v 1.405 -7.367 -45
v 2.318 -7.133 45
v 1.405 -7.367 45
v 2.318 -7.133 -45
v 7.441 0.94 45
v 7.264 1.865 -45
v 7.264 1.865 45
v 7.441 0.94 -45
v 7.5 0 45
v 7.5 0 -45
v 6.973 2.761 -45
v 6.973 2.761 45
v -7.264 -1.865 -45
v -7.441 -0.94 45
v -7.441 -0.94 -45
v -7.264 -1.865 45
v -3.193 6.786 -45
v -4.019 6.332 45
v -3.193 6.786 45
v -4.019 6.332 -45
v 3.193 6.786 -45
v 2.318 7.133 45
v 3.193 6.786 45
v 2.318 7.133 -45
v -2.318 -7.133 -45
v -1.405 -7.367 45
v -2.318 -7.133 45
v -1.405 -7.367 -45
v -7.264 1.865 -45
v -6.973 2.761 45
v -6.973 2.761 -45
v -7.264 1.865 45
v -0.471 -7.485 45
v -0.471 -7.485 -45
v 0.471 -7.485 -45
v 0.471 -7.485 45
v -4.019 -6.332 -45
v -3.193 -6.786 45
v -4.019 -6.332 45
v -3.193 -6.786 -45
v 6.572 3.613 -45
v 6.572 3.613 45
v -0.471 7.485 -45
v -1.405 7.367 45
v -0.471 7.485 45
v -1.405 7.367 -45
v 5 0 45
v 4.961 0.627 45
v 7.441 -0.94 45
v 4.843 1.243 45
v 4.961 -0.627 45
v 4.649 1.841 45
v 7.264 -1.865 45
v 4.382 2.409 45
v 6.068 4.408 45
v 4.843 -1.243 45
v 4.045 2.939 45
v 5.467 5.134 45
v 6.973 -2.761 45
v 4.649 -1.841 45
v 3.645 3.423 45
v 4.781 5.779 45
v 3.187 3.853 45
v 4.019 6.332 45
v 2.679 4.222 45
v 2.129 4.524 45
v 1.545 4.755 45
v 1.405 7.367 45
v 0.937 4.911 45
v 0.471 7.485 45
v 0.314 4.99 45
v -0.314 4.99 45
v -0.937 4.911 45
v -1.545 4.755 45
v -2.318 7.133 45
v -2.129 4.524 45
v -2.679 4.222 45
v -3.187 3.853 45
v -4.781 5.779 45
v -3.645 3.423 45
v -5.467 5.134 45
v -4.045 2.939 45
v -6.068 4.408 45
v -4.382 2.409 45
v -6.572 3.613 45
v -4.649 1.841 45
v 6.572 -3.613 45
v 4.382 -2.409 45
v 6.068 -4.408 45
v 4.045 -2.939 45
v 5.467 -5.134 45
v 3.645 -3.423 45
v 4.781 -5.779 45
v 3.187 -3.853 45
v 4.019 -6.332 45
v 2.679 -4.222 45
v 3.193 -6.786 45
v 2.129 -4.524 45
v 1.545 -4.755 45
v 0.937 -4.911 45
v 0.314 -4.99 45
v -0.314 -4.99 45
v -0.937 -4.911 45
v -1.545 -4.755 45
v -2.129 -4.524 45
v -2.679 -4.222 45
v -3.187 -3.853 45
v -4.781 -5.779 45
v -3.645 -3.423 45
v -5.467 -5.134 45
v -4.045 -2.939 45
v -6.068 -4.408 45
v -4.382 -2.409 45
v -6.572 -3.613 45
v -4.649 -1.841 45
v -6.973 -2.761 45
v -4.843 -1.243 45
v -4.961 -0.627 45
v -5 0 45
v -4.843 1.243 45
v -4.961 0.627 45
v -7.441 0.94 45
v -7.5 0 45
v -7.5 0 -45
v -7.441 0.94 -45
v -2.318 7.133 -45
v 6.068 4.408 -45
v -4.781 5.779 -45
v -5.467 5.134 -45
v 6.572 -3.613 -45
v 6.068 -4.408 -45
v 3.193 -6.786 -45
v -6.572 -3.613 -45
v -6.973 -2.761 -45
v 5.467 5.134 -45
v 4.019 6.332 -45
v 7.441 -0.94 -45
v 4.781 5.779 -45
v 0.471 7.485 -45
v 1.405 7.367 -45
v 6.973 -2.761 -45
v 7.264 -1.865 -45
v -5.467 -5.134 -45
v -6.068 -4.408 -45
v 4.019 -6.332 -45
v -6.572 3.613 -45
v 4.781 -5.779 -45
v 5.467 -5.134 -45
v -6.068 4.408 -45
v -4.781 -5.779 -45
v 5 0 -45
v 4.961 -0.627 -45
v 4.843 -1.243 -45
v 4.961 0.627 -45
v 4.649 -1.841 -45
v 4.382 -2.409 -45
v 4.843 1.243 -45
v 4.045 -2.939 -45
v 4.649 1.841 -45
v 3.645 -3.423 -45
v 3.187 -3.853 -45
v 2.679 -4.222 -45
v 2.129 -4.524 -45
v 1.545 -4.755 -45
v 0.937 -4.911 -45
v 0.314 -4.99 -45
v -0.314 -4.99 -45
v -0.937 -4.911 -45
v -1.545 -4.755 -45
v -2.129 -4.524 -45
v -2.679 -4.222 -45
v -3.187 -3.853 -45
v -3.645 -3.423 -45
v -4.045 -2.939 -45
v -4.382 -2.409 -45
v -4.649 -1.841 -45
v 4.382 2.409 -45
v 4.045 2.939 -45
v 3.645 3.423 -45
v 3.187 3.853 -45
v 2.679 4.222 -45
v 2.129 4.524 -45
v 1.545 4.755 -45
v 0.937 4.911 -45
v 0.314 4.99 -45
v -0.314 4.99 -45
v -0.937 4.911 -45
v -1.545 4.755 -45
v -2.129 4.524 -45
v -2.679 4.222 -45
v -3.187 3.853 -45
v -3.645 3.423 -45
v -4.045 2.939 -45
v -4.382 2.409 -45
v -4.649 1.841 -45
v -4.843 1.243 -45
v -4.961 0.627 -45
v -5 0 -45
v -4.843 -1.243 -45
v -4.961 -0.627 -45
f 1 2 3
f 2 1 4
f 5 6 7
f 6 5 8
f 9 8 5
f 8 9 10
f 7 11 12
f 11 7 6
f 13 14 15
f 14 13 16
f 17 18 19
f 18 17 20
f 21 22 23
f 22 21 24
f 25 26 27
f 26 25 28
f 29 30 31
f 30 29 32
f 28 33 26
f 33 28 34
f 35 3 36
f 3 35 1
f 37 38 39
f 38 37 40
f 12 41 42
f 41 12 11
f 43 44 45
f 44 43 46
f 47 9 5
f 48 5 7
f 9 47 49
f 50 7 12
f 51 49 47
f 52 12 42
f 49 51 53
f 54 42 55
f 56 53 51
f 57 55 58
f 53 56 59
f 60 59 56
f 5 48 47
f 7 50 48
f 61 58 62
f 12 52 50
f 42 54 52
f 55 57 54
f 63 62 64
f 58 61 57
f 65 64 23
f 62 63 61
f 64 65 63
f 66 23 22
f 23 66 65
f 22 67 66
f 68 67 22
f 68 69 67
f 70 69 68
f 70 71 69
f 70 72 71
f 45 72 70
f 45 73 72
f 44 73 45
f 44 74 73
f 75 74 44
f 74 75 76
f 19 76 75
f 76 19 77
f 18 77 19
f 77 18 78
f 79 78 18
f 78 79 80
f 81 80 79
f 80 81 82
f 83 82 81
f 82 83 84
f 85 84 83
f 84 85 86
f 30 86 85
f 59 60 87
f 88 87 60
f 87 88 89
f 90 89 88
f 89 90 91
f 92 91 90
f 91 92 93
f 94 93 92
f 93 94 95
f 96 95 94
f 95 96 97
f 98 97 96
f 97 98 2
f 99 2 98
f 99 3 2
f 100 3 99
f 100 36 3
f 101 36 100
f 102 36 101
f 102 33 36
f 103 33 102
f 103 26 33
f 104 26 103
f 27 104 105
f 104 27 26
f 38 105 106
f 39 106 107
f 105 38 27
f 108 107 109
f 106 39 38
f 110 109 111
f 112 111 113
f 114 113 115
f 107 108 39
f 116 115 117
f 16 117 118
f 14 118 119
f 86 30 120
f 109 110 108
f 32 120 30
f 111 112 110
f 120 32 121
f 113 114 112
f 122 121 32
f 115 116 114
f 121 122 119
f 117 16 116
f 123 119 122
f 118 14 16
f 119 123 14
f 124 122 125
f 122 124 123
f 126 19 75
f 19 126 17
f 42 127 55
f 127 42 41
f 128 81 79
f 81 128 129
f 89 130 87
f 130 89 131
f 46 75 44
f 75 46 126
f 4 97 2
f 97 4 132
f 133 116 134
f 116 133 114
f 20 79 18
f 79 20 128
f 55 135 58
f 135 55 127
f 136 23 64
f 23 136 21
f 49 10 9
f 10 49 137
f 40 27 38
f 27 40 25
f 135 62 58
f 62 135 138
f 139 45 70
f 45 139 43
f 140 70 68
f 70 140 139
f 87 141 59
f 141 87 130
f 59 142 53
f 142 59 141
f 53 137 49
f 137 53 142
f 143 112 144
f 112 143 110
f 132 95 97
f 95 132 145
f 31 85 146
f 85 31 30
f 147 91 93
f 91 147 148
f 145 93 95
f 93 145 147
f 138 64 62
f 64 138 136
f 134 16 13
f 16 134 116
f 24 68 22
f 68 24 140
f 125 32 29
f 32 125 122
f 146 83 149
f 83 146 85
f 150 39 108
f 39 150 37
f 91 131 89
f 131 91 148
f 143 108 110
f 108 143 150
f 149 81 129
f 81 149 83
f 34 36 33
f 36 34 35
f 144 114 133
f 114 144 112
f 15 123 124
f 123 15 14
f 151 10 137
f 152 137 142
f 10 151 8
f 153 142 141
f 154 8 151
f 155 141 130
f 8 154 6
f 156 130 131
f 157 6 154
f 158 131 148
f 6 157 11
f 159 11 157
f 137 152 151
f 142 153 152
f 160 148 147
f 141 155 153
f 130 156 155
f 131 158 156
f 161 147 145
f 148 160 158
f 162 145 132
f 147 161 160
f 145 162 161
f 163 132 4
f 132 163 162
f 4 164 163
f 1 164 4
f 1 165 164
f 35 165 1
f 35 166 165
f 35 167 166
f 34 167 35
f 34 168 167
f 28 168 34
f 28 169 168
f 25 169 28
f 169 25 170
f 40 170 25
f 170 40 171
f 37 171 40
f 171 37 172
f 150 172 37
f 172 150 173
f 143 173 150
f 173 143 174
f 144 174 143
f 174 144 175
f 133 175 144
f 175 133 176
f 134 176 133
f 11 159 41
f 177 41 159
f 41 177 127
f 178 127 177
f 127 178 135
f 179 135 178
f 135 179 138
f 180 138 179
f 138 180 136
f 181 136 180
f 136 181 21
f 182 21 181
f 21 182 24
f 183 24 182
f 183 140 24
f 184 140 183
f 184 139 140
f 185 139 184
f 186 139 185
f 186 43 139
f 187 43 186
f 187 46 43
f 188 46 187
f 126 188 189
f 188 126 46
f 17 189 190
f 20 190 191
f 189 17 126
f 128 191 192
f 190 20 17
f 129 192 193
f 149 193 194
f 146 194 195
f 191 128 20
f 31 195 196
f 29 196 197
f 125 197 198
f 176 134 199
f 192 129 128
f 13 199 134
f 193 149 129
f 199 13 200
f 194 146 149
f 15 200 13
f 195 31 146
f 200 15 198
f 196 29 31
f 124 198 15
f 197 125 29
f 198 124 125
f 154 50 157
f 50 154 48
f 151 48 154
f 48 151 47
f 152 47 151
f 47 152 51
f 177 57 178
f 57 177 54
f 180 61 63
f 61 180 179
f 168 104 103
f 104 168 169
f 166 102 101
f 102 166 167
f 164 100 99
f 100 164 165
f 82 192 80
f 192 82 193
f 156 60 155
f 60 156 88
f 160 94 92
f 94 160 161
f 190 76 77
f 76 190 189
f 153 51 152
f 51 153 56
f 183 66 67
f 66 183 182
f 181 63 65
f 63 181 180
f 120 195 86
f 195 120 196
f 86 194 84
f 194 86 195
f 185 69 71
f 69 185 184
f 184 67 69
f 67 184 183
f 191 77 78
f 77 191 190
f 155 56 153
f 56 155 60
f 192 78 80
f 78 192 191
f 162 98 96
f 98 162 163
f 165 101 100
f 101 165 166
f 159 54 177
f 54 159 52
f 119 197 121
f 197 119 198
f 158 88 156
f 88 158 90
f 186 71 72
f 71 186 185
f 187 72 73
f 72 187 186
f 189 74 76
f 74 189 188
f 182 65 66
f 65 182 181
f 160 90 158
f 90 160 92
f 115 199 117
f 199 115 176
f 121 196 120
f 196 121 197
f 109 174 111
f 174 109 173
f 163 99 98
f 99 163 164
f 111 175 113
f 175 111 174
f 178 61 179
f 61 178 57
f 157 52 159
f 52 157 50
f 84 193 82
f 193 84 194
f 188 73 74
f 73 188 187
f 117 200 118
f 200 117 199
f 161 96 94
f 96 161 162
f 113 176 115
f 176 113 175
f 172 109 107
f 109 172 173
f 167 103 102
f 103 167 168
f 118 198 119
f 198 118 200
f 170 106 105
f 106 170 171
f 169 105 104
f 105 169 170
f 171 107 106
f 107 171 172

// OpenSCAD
$fn = 50;


difference() {
	union() {
		translate(v = [0, 0, -45.0000000000]) {
			cylinder(h = 90, r = 7.5000000000);
		}
	}
	union() {
		translate(v = [0, 0, -100.0000000000]) {
			cylinder(h = 200, r = 5.0000000000);
		}
	}
}
